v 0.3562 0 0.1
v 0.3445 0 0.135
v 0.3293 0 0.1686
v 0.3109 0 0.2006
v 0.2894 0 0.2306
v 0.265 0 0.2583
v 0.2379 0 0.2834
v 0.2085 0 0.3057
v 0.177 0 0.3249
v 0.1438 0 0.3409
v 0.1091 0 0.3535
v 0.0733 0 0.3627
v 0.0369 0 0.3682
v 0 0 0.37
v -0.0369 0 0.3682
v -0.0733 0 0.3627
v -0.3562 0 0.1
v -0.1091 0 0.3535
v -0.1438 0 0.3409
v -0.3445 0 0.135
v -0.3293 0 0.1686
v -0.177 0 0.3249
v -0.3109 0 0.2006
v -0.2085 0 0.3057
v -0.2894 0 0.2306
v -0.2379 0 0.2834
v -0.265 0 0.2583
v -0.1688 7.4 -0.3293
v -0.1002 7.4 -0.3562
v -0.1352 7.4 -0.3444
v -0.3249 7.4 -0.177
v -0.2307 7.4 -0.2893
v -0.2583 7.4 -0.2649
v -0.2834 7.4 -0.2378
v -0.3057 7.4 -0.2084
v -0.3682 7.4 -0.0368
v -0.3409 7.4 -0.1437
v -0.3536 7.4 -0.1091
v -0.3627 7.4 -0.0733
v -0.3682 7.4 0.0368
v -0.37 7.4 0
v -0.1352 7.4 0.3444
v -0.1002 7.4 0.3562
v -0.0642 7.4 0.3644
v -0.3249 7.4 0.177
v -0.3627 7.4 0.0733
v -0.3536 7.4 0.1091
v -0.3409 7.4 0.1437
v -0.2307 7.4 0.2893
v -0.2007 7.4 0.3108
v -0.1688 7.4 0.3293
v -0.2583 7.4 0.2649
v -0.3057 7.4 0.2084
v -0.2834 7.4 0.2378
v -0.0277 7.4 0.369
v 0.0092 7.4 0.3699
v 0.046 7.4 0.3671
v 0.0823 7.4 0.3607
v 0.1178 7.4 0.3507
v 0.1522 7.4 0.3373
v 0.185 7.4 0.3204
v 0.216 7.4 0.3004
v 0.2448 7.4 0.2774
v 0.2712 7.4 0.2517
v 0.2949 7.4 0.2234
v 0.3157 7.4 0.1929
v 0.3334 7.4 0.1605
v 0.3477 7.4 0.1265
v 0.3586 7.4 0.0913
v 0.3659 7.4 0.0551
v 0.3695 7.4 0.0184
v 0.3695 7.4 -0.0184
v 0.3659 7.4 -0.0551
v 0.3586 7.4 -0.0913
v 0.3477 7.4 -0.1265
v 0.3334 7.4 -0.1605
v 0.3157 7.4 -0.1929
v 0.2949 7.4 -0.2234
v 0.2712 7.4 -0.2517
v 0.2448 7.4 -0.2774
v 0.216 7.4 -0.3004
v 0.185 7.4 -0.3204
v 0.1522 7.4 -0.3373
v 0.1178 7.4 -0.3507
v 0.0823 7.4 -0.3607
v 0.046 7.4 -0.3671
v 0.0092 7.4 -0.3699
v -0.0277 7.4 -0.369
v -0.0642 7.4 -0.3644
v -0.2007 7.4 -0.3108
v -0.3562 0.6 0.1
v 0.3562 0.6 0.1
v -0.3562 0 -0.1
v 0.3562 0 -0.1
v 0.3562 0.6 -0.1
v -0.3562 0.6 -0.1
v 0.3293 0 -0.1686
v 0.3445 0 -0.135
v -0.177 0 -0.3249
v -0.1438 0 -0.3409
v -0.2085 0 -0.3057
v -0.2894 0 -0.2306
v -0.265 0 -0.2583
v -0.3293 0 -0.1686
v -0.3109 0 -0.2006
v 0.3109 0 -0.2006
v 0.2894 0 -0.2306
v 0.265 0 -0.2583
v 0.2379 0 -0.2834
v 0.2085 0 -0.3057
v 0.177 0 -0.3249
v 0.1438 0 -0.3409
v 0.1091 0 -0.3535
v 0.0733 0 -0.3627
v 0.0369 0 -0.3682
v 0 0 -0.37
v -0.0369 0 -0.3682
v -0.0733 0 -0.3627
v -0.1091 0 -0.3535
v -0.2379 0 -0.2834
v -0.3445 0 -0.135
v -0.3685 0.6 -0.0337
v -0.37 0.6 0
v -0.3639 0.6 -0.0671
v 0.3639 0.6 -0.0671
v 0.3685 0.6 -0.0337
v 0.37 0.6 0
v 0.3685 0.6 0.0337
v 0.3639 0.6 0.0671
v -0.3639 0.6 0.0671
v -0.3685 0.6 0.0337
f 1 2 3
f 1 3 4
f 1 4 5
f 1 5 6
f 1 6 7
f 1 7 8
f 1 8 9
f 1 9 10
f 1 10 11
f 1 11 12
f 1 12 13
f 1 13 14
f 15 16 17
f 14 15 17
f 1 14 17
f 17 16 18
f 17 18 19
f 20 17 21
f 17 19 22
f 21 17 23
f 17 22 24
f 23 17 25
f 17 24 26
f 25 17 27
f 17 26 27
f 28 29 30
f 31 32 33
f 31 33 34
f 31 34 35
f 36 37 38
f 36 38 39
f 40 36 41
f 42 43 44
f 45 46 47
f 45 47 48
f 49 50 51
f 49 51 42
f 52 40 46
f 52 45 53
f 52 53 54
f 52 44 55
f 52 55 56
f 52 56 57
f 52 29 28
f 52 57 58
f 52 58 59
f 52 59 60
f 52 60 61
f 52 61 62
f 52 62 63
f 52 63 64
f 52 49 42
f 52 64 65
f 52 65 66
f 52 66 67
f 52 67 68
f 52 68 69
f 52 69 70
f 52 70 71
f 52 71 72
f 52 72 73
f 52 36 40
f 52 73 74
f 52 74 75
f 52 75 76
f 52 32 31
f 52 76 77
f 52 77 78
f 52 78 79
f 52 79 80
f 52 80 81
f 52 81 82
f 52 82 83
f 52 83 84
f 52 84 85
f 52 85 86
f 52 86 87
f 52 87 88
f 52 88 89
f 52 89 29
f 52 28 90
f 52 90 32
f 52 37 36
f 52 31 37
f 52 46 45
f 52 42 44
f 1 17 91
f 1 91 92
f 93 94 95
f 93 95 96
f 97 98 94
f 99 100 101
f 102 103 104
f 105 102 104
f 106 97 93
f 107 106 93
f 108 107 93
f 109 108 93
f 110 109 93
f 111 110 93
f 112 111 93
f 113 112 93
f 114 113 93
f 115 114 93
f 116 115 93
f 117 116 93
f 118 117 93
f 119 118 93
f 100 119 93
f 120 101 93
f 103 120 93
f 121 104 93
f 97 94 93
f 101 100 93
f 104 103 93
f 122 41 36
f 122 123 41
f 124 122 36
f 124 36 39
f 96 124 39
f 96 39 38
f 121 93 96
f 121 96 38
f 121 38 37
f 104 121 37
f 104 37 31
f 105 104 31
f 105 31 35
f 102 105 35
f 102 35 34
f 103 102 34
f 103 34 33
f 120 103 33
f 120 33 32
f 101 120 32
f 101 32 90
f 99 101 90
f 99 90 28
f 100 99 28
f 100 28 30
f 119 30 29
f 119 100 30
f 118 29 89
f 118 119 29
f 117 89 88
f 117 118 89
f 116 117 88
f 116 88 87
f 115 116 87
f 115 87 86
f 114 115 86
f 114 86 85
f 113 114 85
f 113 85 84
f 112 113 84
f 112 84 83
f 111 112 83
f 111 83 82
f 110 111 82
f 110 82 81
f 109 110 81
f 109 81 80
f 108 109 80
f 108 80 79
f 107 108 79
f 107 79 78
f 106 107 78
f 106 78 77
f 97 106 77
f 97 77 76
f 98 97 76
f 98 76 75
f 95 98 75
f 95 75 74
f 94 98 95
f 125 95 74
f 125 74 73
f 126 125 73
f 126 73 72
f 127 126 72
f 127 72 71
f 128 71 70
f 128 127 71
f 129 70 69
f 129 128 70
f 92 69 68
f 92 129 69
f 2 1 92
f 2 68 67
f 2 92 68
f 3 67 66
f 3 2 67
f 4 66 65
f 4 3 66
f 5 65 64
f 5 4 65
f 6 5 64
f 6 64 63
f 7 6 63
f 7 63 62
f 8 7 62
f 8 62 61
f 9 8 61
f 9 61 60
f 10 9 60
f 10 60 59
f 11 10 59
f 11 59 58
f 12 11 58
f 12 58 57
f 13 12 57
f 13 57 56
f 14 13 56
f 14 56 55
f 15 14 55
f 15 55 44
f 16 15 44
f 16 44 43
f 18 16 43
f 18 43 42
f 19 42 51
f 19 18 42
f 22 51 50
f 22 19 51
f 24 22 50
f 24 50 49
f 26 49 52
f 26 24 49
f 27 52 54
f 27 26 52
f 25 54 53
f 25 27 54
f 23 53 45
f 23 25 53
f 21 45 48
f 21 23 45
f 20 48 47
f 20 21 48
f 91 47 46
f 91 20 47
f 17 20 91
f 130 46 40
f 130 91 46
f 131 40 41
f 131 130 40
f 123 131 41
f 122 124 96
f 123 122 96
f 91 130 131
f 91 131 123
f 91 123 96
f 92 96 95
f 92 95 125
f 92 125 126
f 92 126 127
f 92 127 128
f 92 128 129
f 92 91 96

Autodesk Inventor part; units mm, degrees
ref_plane "YZ Plane" through (0, 0, 0) normal (1, 0, 0) x (0, 1, 0)
ref_plane "XZ Plane" through (0, 0, 0) normal (0, 1, 0) x (-1, 0, 0)
ref_plane "XY Plane" through (0, 0, 0) normal (0, 0, 1) x (1, 0, 0)
sketch "Boceto1" plane through (0, 0, 0) normal (0, 1, 0) x (-1, 0, 0)
  circle A0 centre (0, 0) radius 0.37
  dimension "d0" = 0.74
extrude "Extrusión1" add sketch "Boceto1" along normal blind 7.4
sketch "Boceto2" plane through (0, 0, 0) normal (0, -1, 0) x (1, 0, 0)
  line L0 (0, 0) -> (-0.6417, 0)
  line L1 (-0.6417, 0) -> (-0.6417, 0.1)
  line L2 (-0.6417, 0.1) -> (2.3583, 0.1)
  line L3 (2.3583, 0.1) -> (2.3583, -0.1)
  line L4 (2.3583, -0.1) -> (-0.6417, -0.1)
  line L5 (-0.6417, 0) -> (-0.6417, -0.1)
  dimension "d3" = 0.1
  dimension "d4" = 3
  dimension "d5" = 0.2
extrude "Extrusión2" cut sketch "Boceto2" against normal blind 0.6
